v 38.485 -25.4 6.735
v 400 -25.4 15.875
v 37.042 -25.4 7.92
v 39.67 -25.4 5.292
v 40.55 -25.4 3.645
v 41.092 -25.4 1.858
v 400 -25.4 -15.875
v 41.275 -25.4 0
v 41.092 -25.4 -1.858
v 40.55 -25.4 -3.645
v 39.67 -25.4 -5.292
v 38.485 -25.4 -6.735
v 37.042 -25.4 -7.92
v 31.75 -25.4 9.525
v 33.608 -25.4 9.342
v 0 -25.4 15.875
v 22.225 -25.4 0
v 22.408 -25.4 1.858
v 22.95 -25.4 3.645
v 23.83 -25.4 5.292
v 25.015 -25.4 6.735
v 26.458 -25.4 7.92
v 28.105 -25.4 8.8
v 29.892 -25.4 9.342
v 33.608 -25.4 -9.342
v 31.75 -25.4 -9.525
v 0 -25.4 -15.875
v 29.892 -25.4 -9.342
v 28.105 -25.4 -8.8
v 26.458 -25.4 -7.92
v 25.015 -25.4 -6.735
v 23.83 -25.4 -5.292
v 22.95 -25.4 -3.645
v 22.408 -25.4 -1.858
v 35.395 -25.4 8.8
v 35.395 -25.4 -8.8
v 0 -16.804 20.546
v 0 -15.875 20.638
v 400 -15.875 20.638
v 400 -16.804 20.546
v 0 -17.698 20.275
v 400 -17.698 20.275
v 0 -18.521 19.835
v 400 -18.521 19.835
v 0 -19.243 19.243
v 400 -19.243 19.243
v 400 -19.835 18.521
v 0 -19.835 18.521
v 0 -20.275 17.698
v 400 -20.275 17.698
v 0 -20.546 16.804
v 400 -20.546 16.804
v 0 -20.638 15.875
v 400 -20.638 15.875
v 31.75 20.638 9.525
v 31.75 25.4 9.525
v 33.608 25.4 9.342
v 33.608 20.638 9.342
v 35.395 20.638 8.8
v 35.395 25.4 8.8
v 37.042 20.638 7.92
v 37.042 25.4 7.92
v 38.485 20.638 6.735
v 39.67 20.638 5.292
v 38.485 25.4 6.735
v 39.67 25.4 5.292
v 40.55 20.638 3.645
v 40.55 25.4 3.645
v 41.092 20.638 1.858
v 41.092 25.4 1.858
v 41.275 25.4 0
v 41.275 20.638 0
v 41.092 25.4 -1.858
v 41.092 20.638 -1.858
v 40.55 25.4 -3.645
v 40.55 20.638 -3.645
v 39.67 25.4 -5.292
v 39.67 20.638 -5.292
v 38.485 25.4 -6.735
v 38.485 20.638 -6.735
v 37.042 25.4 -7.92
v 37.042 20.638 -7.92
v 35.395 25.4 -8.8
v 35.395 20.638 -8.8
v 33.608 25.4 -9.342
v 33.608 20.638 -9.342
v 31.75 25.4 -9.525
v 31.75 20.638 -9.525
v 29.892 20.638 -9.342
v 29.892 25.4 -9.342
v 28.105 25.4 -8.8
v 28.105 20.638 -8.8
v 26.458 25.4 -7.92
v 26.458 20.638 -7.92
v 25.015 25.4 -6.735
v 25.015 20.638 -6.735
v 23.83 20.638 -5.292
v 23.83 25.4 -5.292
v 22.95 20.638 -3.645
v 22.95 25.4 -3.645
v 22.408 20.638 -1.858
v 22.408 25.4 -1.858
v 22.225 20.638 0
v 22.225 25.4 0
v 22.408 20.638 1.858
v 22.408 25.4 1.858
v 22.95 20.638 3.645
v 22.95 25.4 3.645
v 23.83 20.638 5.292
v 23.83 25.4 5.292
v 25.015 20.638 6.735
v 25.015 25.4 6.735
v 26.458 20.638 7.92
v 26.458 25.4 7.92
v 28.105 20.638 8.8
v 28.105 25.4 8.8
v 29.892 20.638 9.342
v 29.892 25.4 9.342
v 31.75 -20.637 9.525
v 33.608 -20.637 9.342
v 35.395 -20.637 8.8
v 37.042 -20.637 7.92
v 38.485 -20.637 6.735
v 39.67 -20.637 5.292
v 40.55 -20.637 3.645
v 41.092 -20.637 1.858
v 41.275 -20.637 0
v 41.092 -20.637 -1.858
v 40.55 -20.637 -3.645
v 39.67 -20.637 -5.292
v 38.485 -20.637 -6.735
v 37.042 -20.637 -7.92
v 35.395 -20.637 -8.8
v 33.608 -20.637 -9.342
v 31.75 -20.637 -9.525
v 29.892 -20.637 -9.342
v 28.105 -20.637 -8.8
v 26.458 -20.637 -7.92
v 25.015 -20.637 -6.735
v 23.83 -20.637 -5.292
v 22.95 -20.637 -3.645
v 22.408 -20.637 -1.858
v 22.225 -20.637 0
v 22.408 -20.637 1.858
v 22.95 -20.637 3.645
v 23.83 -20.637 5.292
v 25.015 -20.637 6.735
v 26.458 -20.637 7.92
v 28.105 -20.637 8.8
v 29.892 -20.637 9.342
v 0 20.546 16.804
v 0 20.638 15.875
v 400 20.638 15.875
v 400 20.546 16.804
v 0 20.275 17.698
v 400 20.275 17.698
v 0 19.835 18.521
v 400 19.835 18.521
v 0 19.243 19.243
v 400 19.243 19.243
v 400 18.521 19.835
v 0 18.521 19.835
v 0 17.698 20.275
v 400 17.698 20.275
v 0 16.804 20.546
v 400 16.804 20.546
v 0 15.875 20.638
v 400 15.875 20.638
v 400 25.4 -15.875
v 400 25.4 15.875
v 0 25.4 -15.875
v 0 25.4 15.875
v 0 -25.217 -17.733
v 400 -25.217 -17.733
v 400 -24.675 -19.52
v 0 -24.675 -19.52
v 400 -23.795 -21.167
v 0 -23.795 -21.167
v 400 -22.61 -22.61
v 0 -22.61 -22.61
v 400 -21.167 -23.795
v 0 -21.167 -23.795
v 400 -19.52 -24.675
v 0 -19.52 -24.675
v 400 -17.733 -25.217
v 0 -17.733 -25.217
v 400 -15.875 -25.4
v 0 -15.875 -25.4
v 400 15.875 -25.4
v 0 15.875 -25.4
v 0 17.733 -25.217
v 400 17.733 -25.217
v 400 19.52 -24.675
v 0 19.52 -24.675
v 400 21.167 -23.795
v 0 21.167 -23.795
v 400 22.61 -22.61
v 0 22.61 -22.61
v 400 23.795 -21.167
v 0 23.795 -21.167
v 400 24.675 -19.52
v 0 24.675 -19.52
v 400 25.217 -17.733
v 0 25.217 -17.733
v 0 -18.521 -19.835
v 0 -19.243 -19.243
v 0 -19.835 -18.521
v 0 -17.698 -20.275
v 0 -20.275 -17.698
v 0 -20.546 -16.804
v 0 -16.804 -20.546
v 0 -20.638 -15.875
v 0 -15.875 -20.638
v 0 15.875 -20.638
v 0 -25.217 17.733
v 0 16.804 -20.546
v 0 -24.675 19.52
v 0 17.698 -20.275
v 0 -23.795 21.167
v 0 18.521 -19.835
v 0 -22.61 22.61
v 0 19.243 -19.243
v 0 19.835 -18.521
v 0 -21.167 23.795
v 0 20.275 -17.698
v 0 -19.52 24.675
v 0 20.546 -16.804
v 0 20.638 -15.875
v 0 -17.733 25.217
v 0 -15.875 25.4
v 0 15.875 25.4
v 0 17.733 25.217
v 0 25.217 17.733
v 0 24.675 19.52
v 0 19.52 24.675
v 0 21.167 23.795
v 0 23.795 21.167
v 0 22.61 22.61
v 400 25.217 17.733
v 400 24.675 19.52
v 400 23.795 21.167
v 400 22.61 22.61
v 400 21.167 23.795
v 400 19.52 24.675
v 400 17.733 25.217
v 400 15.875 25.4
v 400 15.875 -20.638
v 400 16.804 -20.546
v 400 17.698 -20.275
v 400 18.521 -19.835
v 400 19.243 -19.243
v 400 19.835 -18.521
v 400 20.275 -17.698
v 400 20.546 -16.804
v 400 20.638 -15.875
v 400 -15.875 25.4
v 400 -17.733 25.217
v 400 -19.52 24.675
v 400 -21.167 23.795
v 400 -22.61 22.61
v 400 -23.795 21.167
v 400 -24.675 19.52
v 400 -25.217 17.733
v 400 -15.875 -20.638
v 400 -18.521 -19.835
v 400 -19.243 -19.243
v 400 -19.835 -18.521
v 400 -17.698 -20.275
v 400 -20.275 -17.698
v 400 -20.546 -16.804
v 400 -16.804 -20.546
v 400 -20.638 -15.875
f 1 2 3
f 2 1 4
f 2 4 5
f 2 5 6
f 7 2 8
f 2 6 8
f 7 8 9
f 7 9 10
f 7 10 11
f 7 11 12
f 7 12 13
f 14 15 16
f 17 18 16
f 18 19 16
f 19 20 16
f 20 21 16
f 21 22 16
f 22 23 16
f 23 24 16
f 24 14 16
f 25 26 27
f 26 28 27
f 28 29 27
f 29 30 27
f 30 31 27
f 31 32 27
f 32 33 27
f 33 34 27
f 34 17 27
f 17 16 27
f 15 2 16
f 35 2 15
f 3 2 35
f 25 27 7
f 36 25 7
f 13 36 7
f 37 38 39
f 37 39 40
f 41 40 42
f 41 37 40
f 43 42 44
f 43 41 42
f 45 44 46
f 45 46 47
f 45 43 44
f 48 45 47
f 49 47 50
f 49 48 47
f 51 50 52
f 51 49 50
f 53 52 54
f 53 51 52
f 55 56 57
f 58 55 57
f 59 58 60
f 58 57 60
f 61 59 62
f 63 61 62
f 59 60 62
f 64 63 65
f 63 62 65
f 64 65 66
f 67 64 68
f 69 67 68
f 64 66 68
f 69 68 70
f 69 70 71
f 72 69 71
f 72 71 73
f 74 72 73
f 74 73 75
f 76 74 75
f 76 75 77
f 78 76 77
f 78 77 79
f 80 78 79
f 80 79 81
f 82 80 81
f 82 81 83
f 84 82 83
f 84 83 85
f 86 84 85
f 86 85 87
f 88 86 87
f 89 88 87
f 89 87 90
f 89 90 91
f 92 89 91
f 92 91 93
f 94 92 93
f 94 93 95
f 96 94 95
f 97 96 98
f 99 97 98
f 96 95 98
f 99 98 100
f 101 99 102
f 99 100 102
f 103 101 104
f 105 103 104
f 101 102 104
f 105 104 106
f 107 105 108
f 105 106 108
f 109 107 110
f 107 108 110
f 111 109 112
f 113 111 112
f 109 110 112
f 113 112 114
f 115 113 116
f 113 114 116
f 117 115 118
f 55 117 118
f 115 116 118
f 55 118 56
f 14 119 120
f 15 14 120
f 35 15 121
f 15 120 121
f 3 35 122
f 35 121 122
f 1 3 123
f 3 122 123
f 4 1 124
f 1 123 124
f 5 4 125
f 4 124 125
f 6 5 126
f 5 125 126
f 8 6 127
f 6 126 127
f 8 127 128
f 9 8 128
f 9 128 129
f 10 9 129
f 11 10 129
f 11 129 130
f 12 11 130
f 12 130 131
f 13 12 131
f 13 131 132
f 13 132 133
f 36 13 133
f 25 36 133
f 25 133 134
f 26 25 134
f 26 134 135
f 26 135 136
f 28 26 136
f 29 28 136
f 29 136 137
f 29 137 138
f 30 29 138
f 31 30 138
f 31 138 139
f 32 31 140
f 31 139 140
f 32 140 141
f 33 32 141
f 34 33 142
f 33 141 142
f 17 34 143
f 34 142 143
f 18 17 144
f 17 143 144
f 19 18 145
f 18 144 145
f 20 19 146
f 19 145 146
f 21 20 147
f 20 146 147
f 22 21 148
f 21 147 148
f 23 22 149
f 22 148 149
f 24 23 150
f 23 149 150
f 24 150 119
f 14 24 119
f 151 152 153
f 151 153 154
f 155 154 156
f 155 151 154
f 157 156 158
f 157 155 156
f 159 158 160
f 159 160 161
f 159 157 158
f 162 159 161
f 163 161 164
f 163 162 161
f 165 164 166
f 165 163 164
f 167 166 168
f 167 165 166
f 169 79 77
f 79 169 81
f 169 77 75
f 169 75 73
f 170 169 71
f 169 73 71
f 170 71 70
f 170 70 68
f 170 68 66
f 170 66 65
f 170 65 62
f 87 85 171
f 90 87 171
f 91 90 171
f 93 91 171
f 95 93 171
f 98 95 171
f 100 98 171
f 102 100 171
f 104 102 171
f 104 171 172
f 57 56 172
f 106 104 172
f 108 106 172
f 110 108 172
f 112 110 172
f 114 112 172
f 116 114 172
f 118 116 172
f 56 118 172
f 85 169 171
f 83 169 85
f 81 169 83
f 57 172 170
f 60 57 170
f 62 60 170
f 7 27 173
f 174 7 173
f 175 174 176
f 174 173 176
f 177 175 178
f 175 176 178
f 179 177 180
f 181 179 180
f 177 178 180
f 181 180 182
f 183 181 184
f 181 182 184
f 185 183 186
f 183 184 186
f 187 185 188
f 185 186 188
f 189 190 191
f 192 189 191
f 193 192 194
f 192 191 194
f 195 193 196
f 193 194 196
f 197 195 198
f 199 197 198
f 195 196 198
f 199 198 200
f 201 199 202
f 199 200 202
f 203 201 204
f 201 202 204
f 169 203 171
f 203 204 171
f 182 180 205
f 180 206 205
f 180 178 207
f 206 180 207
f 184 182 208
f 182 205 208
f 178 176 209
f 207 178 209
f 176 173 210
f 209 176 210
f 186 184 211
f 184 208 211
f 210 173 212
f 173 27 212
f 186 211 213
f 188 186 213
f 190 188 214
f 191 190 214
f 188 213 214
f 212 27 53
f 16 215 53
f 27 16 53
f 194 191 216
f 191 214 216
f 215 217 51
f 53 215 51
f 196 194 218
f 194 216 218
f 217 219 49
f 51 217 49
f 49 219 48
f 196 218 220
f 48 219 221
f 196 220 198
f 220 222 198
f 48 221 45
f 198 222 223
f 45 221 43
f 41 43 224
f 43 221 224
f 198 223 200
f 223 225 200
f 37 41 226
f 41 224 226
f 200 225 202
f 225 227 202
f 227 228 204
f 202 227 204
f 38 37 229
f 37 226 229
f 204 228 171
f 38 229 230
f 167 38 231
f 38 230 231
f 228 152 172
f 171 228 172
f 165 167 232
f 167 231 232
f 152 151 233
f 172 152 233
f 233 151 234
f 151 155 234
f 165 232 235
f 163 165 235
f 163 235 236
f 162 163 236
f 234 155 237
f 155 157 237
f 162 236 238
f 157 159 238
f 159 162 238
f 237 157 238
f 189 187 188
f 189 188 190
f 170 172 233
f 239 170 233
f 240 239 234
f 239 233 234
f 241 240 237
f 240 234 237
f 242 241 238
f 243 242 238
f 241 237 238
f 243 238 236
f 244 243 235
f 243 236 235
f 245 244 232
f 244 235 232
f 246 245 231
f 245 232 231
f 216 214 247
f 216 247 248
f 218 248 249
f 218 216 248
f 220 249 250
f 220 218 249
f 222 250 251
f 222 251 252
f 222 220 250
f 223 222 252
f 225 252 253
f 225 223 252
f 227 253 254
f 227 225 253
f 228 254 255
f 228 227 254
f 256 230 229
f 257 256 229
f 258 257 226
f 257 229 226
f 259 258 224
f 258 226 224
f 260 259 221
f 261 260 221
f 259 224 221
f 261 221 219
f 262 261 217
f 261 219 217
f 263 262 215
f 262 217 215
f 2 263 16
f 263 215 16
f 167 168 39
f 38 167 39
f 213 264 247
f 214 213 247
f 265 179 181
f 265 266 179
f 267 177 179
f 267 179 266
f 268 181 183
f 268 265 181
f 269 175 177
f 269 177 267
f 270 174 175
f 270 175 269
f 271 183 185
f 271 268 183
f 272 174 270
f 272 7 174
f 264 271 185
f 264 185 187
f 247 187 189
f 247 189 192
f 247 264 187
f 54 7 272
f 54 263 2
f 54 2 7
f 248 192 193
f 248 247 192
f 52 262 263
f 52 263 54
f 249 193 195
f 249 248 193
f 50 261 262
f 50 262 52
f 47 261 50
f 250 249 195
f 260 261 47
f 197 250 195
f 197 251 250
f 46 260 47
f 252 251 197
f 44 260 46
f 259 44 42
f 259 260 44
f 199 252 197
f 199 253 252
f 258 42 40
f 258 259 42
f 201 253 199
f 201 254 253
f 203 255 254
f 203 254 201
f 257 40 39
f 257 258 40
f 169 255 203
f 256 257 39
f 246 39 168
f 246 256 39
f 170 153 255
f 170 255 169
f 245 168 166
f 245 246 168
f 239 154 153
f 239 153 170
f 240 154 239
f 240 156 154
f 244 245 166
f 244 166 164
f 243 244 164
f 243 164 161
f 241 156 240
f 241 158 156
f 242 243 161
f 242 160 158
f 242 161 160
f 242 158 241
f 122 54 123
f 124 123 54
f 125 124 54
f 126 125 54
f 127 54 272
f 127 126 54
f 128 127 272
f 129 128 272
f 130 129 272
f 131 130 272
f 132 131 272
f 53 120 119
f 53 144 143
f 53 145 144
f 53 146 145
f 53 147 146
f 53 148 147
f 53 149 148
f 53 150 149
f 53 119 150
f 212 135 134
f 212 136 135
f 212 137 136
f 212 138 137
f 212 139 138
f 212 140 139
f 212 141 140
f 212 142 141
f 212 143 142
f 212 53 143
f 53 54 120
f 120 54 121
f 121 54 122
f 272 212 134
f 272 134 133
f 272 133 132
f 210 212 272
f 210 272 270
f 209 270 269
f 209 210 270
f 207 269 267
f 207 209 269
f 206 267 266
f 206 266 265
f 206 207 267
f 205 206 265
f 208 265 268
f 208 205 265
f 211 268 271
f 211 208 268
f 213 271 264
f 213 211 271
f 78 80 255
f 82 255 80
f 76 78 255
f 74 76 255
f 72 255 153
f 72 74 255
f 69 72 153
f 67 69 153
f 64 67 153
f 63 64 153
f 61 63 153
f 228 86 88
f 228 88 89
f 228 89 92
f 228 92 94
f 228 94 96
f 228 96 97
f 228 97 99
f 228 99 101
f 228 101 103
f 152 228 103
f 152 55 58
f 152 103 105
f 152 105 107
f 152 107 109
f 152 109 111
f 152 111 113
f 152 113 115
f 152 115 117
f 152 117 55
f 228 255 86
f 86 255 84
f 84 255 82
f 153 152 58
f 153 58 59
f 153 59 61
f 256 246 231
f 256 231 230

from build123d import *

# Parameters (mm, degrees)
TUBE_SQUARE_TS2X2X0_1875_1_DEPTH = 400
SKETCH12_R                       = 9.525
CUT_EXTRUDE1_DEPTH               = 405.012128531


with BuildPart() as part:
    # Sketch11 → Tube square TS2X2X0.1875(1) (new body)
    with BuildSketch(Plane.YZ):
        with BuildLine():
            Line((-15.875, -25.4), (15.875, -25.4))
            ThreePointArc((15.875, -25.4), (22.610192091, -22.610192091), (25.4, -15.875))
            Line((25.4, -15.875), (25.4, 15.875))
            ThreePointArc((25.4, 15.875), (22.610192091, 22.610192091), (15.875, 25.4))
            Line((15.875, 25.4), (-15.875, 25.4))
            ThreePointArc((-15.875, 25.4), (-22.610192091, 22.610192091), (-25.4, 15.875))
            Line((-25.4, 15.875), (-25.4, -15.875))
            ThreePointArc((-25.4, -15.875), (-22.610192091, -22.610192091), (-15.875, -25.4))
        make_face()
        with BuildLine():
            Line((-15.875, -20.6375), (15.875, -20.6375))
            ThreePointArc((15.875, -20.6375), (19.242596045, -19.242596045), (20.6375, -15.875))
            Line((20.6375, -15.875), (20.6375, 15.875))
            ThreePointArc((20.6375, 15.875), (19.242596045, 19.242596045), (15.875, 20.6375))
            Line((15.875, 20.6375), (-15.875, 20.6375))
            ThreePointArc((-15.875, 20.6375), (-19.242596045, 19.242596045), (-20.6375, 15.875))
            Line((-20.6375, 15.875), (-20.6375, -15.875))
            ThreePointArc((-20.6375, -15.875), (-19.242596045, -19.242596045), (-15.875, -20.6375))
        make_face(mode=Mode.SUBTRACT)
    extrude(amount=TUBE_SQUARE_TS2X2X0_1875_1_DEPTH)

    # Sketch12 → Cut-Extrude1 (cut, through all)
    with BuildSketch(Plane(origin=(0, 25.4, 0), x_dir=(1, 0, 0), z_dir=(0, 1, 0))):
        with Locations(Location((31.75, 0, 0), (0, 0, 270))):
            Circle(SKETCH12_R)
    extrude(amount=-CUT_EXTRUDE1_DEPTH, mode=Mode.SUBTRACT)


solid = part.part
